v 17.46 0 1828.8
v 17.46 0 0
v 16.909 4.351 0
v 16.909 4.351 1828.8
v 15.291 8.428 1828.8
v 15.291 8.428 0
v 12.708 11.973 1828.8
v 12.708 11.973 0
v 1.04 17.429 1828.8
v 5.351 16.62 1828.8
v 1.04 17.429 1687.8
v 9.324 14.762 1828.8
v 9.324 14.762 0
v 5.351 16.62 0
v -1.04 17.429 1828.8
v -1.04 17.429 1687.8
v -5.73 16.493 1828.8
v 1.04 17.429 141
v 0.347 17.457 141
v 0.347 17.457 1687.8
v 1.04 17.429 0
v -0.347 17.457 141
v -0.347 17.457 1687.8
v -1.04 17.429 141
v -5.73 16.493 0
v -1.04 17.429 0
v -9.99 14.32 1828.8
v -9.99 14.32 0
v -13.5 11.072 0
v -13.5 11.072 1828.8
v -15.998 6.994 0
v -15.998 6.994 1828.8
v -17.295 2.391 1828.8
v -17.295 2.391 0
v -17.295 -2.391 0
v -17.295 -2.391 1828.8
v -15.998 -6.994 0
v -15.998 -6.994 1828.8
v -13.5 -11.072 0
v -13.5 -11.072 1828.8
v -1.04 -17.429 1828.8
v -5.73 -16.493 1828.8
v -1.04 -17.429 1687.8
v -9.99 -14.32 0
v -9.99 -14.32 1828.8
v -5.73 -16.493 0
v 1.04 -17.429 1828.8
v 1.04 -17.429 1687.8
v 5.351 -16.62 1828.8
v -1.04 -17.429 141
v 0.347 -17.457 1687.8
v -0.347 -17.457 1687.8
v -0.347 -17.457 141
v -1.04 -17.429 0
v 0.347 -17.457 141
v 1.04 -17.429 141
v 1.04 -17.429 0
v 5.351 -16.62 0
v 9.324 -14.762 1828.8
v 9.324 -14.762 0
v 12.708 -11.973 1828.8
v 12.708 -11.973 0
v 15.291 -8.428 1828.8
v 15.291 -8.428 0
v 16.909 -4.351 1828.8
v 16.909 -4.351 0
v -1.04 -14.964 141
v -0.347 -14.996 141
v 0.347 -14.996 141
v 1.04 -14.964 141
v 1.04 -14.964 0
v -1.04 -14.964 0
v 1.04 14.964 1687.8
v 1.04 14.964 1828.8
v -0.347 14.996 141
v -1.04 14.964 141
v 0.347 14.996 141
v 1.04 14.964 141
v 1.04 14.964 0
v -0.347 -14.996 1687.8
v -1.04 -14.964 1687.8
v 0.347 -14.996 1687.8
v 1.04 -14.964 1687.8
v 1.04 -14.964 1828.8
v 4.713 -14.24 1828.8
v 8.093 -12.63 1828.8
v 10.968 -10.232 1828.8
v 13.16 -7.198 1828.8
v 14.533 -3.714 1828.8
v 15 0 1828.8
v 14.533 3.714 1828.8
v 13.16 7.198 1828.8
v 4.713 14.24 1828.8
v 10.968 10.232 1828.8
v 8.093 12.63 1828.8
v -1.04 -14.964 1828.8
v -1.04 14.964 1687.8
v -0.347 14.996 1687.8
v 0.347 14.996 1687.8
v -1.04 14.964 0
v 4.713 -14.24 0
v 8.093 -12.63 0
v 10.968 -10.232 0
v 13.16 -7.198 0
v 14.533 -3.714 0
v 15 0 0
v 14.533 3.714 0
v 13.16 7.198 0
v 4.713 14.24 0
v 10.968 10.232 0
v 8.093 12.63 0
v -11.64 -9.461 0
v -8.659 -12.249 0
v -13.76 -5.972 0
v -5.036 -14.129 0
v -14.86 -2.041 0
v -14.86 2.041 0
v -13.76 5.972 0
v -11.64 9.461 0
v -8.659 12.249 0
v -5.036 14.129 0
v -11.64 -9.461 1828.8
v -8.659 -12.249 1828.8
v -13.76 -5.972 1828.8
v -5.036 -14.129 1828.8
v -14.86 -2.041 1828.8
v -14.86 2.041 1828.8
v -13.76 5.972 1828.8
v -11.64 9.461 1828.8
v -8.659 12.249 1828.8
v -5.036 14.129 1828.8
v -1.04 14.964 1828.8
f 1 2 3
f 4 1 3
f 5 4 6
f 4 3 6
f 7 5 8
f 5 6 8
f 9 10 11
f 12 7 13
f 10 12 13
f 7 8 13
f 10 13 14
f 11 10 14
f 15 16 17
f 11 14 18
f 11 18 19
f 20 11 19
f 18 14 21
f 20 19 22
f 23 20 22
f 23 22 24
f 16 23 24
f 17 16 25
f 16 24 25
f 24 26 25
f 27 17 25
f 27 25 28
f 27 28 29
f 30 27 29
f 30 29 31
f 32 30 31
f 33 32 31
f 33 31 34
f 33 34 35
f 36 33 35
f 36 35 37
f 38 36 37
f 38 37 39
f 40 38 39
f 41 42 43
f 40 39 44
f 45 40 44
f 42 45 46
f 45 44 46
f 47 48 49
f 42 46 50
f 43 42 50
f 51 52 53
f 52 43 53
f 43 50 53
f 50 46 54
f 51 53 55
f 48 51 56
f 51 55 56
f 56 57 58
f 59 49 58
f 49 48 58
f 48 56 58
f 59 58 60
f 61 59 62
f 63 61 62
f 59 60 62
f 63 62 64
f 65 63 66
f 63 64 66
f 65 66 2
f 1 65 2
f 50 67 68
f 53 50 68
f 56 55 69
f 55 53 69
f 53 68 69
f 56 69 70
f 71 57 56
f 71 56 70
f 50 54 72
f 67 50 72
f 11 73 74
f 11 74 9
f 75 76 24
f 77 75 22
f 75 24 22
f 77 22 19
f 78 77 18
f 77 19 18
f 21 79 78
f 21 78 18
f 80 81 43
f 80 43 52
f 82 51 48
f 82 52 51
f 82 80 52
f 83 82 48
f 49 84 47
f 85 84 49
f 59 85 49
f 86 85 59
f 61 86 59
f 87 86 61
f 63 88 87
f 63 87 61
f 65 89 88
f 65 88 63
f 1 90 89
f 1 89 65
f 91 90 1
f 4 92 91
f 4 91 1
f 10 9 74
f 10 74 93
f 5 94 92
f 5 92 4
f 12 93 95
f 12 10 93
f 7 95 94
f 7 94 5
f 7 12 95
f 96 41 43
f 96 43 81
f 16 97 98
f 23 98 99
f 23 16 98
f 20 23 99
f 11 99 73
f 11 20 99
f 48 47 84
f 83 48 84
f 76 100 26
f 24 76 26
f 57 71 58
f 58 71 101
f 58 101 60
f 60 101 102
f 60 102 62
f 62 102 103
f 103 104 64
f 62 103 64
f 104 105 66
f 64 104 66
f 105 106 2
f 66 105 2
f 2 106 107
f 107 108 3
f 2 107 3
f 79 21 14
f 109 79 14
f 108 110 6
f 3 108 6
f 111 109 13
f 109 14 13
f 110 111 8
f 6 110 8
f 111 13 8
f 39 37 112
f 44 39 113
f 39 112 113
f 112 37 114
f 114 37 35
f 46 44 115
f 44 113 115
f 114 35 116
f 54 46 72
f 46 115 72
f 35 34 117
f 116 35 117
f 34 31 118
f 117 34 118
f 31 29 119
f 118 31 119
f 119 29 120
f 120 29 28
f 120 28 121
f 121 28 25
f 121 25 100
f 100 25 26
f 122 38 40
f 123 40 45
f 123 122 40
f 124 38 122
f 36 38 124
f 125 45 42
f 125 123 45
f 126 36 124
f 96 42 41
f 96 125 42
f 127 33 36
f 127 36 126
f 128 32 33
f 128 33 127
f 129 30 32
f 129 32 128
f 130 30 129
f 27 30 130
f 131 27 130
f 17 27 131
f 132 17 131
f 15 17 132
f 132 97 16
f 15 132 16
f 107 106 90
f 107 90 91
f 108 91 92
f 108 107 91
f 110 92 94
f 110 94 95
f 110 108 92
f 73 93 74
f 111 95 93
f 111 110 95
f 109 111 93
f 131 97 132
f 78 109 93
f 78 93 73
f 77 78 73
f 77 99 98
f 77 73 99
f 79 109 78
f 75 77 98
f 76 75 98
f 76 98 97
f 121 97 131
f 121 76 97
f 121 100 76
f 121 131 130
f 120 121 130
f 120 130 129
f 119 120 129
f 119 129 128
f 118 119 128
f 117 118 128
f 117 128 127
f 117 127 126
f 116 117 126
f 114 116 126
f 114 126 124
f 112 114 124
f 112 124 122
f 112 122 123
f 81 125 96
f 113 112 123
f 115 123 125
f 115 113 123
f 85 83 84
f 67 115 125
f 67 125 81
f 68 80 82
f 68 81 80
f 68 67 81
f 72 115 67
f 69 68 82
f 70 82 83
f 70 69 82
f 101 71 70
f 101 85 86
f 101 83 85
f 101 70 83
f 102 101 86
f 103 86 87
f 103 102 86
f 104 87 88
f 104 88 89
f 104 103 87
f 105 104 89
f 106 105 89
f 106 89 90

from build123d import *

# Parameters (mm, degrees)
SKETCH1_R           = 17.46
SKETCH1_R_2         = 15
BOSS_EXTRUDE1_DEPTH = 1828.8
SKETCH4_W           = 2.08
SKETCH4_H           = 50
CUT_EXTRUDE2_DEPTH  = 141
SKETCH7_W           = 2.08
SKETCH7_H           = 50
CUT_EXTRUDE3_DEPTH  = 141


with BuildPart() as part:
    # Sketch1 → Boss-Extrude1 (new body)
    with BuildSketch(Plane.XY):
        Circle(SKETCH1_R)
        Circle(SKETCH1_R_2, mode=Mode.SUBTRACT)
    extrude(amount=BOSS_EXTRUDE1_DEPTH)

    # Sketch4 → Cut-Extrude2 (cut)
    with BuildSketch(Plane.XY):
        Rectangle(SKETCH4_W, SKETCH4_H)
    extrude(amount=CUT_EXTRUDE2_DEPTH, mode=Mode.SUBTRACT)

    # Sketch7 → Cut-Extrude3 (cut)
    with BuildSketch(Plane.XY.offset(1828.8)):
        Rectangle(SKETCH7_W, SKETCH7_H)
    extrude(amount=-CUT_EXTRUDE3_DEPTH, mode=Mode.SUBTRACT)


solid = part.part
